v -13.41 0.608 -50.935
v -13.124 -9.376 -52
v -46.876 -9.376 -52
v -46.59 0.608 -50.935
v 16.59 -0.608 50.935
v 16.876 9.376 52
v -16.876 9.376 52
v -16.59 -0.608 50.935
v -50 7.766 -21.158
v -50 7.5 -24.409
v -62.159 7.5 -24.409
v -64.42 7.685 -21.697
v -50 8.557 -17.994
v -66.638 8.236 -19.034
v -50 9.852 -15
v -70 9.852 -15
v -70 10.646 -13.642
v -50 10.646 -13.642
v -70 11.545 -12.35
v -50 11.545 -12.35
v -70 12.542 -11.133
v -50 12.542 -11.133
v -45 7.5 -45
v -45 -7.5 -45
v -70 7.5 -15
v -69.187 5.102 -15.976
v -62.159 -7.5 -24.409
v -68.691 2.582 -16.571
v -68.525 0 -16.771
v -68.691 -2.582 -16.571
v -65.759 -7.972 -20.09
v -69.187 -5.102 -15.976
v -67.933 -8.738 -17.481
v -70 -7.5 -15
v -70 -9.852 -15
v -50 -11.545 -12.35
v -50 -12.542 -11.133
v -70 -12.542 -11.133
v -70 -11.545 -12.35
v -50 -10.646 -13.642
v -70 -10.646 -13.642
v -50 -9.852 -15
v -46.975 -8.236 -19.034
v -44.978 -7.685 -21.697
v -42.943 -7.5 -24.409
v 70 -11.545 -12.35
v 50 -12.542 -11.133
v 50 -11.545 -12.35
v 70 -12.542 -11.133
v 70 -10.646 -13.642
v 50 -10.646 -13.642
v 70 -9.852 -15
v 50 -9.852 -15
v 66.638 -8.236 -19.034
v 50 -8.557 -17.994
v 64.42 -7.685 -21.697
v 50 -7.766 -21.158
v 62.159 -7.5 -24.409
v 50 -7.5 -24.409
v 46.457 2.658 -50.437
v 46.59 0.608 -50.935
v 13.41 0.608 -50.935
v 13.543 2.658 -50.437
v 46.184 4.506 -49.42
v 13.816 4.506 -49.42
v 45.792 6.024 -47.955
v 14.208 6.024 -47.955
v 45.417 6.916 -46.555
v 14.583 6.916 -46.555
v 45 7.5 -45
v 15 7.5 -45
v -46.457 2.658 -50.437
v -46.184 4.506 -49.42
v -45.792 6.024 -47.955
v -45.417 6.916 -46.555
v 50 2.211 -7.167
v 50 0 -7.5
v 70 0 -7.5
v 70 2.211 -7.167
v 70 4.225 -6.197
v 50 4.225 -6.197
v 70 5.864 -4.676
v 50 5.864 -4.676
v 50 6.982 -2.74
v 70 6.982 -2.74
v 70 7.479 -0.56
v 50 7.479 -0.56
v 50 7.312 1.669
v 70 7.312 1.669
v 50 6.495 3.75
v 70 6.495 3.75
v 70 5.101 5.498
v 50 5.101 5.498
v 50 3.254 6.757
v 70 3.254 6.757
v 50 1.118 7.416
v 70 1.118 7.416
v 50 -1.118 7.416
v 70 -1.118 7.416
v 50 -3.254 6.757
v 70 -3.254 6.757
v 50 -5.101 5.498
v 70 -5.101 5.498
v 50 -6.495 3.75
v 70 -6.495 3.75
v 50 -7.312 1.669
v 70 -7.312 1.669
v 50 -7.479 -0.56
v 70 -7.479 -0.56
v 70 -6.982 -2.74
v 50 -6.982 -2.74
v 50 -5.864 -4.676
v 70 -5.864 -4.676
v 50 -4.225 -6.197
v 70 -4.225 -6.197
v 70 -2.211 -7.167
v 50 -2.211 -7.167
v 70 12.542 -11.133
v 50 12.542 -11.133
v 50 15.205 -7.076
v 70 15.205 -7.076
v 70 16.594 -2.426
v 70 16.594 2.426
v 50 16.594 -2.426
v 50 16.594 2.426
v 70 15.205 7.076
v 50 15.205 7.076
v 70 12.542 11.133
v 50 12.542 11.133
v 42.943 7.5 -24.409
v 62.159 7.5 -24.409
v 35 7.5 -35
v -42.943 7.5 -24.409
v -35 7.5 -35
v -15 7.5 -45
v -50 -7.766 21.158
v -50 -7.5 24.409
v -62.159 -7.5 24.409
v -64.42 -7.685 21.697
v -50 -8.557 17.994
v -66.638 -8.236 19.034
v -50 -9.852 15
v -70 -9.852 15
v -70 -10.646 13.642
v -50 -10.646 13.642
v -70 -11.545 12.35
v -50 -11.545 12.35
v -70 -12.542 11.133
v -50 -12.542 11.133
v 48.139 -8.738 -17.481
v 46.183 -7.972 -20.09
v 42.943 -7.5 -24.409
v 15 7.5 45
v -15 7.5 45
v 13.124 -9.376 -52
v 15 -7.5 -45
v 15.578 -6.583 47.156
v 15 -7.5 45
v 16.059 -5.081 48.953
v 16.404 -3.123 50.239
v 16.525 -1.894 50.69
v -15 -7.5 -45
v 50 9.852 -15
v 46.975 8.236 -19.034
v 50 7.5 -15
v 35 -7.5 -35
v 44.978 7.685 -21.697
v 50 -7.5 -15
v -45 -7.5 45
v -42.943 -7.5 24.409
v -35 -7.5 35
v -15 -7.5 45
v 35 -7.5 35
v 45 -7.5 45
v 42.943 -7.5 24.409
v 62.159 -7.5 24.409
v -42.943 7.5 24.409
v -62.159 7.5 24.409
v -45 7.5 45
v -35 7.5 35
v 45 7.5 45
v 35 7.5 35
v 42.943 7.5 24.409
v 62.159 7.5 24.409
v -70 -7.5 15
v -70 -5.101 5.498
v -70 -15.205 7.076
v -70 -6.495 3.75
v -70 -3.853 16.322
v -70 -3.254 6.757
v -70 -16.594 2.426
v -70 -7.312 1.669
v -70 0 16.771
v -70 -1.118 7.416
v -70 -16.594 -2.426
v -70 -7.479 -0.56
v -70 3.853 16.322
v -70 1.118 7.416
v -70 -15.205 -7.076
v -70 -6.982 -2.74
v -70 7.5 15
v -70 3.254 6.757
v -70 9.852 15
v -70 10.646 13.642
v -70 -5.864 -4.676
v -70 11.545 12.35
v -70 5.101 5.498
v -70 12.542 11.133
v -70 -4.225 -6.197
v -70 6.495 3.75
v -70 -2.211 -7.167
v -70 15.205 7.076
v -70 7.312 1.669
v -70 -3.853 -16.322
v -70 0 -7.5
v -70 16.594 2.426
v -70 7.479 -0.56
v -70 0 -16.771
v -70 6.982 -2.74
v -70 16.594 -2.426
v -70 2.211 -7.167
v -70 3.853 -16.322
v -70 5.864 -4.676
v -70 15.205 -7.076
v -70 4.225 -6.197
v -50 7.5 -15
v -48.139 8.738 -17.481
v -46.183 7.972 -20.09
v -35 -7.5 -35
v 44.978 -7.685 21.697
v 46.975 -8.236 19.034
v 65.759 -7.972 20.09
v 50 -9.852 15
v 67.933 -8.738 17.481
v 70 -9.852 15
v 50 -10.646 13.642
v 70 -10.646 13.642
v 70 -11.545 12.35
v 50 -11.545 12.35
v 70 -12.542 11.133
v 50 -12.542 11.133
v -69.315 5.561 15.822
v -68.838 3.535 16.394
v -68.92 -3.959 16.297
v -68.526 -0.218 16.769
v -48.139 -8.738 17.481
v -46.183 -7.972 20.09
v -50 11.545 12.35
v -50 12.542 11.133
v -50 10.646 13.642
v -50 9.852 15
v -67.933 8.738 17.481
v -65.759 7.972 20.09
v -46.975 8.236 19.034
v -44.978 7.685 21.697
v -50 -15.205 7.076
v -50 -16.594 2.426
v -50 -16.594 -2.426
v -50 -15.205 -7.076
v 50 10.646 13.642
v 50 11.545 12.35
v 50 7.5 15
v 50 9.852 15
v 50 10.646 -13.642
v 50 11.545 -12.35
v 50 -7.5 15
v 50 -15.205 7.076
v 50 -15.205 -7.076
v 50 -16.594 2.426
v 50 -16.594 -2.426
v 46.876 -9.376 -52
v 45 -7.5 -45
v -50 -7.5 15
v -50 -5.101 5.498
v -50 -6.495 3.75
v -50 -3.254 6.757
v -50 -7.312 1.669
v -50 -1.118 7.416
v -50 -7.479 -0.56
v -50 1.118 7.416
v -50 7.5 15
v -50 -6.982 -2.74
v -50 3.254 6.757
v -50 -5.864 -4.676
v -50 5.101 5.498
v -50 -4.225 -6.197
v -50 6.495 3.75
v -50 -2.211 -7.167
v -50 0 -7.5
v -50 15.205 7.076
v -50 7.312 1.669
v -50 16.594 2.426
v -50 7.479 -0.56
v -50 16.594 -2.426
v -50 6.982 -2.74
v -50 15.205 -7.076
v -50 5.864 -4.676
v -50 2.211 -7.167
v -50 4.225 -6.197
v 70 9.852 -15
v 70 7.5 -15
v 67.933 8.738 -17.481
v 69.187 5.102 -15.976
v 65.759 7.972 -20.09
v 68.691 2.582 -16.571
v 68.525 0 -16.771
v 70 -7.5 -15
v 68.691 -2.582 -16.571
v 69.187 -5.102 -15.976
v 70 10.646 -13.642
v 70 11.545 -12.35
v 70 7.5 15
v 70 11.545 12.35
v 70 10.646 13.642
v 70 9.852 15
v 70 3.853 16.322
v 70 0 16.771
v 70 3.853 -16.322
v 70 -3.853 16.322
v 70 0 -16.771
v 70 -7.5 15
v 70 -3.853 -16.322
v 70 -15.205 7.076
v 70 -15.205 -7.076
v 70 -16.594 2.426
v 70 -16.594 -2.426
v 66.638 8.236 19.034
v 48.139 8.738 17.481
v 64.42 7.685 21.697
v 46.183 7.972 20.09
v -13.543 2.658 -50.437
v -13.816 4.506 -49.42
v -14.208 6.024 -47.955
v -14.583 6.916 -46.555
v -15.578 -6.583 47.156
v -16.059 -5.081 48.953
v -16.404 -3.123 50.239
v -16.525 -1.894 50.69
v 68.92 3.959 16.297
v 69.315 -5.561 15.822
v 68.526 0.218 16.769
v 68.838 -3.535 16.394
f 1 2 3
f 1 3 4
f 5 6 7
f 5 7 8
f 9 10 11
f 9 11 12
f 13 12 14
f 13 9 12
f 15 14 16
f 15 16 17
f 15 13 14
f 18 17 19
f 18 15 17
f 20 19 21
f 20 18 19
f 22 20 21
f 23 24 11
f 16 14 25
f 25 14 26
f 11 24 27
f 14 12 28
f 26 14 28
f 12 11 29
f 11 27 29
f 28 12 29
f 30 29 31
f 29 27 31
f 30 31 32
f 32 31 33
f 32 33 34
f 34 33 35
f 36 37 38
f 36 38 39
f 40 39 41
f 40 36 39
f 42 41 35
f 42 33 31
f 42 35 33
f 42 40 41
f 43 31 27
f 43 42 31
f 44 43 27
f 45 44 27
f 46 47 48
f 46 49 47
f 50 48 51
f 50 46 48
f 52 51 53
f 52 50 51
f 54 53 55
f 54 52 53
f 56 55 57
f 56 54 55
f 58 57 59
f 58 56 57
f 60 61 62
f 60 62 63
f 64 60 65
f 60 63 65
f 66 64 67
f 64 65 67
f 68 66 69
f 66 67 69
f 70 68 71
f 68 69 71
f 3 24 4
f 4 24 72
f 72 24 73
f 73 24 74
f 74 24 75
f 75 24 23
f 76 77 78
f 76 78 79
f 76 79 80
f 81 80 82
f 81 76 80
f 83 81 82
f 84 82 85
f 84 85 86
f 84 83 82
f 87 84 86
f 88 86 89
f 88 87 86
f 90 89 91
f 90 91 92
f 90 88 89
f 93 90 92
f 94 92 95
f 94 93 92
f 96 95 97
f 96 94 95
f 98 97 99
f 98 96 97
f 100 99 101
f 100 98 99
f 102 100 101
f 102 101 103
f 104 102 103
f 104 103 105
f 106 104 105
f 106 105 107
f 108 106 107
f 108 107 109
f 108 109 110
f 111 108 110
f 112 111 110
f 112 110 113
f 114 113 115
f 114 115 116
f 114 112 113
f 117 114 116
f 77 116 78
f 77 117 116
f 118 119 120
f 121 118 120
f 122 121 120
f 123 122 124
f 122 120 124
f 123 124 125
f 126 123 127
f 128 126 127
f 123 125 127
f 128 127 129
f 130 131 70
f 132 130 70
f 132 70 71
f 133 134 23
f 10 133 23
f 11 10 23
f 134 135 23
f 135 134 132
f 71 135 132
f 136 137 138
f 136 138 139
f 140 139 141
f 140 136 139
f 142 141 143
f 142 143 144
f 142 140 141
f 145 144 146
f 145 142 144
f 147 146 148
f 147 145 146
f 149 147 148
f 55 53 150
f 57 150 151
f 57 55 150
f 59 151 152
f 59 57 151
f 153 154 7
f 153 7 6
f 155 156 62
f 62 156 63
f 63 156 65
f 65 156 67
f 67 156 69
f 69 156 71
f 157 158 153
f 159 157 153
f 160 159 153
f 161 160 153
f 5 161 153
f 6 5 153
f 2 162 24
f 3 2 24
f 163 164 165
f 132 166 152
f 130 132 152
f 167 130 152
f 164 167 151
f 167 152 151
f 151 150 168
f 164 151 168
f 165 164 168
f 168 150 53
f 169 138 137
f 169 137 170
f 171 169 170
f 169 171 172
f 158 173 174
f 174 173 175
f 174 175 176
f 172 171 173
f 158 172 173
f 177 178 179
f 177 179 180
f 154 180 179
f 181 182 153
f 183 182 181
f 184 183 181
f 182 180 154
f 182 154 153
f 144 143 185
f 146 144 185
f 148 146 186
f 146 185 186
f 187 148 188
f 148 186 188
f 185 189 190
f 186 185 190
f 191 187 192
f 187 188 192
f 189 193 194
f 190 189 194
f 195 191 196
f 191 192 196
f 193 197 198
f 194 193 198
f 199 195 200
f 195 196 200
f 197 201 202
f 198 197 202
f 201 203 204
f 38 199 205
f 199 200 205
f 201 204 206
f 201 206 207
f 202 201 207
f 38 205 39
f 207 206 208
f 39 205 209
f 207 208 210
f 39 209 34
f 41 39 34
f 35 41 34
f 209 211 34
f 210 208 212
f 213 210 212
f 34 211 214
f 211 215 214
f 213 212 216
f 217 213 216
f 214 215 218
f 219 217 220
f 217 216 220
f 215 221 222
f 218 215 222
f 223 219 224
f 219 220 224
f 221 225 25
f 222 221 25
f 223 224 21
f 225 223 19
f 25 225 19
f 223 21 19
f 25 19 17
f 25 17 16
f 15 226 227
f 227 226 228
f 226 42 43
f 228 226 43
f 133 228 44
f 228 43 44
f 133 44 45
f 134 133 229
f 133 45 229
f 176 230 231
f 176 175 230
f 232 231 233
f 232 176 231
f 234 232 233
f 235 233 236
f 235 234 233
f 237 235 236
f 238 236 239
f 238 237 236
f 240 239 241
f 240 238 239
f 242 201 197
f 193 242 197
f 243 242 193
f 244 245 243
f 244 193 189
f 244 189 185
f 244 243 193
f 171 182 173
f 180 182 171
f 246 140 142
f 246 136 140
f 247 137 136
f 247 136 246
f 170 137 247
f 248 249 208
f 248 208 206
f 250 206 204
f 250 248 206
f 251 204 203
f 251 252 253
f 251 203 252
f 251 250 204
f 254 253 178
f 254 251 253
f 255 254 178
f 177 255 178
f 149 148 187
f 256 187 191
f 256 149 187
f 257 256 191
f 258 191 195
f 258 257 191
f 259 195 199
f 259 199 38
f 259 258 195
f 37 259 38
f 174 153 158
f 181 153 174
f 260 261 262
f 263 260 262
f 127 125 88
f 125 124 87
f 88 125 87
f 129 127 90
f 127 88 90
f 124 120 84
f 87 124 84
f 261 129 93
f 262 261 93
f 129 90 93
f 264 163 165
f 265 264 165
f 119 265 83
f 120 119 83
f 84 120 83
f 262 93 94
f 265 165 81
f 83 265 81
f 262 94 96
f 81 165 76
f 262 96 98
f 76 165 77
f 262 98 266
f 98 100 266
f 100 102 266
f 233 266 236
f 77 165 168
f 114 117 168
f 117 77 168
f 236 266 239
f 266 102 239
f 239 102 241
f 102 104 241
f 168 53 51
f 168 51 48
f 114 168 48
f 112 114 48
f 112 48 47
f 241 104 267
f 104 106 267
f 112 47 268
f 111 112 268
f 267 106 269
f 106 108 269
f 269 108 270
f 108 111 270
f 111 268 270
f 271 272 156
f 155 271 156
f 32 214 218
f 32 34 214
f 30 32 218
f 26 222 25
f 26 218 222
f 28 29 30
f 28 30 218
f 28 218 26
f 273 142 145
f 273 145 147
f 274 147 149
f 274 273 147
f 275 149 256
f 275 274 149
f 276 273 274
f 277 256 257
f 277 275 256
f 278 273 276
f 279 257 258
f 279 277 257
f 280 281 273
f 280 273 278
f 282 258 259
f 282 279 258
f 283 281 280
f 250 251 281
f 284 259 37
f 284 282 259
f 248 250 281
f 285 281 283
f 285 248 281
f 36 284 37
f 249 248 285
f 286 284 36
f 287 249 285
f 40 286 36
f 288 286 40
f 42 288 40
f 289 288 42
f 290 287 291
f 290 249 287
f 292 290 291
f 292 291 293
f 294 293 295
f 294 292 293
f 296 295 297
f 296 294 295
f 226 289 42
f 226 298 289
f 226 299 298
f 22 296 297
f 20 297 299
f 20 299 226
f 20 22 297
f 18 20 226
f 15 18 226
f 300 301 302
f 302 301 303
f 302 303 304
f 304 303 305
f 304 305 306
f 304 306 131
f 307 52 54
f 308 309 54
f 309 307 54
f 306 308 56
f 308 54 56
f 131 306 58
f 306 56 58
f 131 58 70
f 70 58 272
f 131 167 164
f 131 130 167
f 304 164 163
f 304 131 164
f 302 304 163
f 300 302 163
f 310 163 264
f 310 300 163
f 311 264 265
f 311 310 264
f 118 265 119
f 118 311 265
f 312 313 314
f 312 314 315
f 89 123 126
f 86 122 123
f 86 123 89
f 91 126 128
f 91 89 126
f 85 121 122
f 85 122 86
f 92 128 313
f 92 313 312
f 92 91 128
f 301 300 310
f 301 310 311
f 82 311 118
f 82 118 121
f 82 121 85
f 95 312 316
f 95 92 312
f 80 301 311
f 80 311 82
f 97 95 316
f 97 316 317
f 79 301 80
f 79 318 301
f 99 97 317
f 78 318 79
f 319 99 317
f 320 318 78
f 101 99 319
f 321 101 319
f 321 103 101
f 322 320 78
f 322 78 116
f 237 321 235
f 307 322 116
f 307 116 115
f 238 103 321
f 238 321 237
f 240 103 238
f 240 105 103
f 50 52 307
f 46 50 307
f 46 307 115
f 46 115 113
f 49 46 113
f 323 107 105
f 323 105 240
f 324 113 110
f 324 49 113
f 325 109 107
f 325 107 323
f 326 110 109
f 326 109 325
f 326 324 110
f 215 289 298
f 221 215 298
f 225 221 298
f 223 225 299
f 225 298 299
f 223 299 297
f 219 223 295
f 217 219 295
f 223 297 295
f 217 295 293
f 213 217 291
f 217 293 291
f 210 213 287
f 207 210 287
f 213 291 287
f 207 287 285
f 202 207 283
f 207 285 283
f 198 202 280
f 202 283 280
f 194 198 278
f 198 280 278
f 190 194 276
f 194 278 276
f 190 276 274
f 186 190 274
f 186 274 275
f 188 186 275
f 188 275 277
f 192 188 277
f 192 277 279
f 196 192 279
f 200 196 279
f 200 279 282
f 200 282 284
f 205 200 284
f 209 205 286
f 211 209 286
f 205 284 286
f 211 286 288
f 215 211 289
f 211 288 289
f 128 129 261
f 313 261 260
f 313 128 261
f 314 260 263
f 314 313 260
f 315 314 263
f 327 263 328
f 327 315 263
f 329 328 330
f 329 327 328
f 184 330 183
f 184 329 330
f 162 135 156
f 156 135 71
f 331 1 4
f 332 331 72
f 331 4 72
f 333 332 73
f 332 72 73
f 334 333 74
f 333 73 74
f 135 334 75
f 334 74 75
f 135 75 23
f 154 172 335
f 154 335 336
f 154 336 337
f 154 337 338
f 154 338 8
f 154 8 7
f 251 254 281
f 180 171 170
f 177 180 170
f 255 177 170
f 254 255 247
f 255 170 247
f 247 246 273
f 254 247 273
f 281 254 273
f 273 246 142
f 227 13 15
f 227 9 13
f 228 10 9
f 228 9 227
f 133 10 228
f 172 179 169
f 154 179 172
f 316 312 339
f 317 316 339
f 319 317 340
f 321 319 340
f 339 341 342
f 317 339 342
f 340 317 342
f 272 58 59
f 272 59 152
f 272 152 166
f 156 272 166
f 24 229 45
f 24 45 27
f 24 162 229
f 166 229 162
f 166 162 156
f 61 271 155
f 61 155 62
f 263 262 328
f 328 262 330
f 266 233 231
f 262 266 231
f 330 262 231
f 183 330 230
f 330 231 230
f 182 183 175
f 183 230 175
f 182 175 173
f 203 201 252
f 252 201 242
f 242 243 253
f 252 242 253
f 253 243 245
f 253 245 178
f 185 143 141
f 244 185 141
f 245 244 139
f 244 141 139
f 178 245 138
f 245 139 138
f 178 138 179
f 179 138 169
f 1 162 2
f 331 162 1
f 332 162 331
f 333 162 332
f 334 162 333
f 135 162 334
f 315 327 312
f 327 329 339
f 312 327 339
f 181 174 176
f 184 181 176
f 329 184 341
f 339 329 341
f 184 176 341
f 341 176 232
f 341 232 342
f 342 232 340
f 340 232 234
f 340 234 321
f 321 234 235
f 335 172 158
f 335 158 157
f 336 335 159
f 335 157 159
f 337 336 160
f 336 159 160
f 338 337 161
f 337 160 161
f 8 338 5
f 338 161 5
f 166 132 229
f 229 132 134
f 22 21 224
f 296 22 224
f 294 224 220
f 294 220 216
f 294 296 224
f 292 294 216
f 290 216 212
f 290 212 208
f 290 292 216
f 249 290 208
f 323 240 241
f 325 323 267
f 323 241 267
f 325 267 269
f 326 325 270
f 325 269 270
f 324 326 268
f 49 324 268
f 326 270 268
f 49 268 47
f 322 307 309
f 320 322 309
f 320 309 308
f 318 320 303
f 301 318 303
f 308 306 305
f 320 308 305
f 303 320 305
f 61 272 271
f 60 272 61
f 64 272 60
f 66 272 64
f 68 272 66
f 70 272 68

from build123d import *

# Parameters (mm, degrees)
RESSALTO_EXTRUS_O1_DEPTH           = 7.5
RESSALTO_EXTRUS_O1_2_DEPTH         = 7.5
ESBO_O2_R                          = 16.770509831
ESBO_O2_R_2                        = 7.5
RESSALTO_EXTRUS_O2_DEPTH           = 20
FILETE1_R                          = 20
ESBO_O3_W                          = 30
ESBO_O3_H                          = 15
RESSALTO_EXTRUS_O3_DEPTH           = 7
RESSALTO_EXTRUS_O3_DRAFT           = -15
ESBO_O4_W                          = 30
ESBO_O4_H                          = 15
RESSALTO_EXTRUS_O4_DEPTH           = 7
RESSALTO_EXTRUS_O4_DRAFT           = -15
RESSALTO_EXTRUS_O4_PROFILE_2_DEPTH = 7
RESSALTO_EXTRUS_O4_PROFILE_2_DRAFT = -15
CORTE_EXTRUS_O1_DEPTH              = 16.88
CORTE_EXTRUS_O2_DEPTH              = 46.88
FILETE4_R                          = 8


with BuildPart() as part:
    # Esboço1 → Ressalto-extrusão1 (new, symmetric)
    with BuildSketch(Plane(origin=(0, 0, 0), x_dir=(1, 0, 0), z_dir=(0, 1, 0))):
        Polygon((45, -45), (70, -15), (50, -15), (35, -35), (-35, -35), (-50, -15), (-70, -15), (-45, -45), align=None)
    extrude(amount=RESSALTO_EXTRUS_O1_DEPTH, both=True)



with BuildPart() as body_2:
    # Esboço1 → Ressalto-extrus_o1 2 (new, symmetric)
    with BuildSketch(Plane(origin=(0, 0, 0), x_dir=(1, 0, 0), z_dir=(0, 1, 0))):
        Polygon((70, 15), (50, 15), (35, 35), (-35, 35), (-50, 15), (-70, 15), (-45, 45), (45, 45), align=None)
    extrude(amount=RESSALTO_EXTRUS_O1_2_DEPTH, both=True)


with BuildPart() as part_1:
    add(part.part)

    add(body_2.part)  # Ressalto-extrusão2 merges body 2
    # Esboço2 → Ressalto-extrusão2 (add)
    with BuildSketch(Plane(origin=(-50, 0, 0), x_dir=(0, 0, -1), z_dir=(1, 0, 0))):
        Circle(ESBO_O2_R)
        Circle(ESBO_O2_R_2, mode=Mode.SUBTRACT)
    ressalto_extrus_o2 = extrude(amount=-RESSALTO_EXTRUS_O2_DEPTH)

    # Espelhar1: Ressalto-extrusão2 across plane
    add(ressalto_extrus_o2.mirror(Plane(origin=(0, 0, 0), x_dir=(0, 0, 1), z_dir=(1, 0, 0))))

    # Filete1
    # the kernel refuses this fillet: 20 mm, written as the material it adds along each edge
    with BuildSketch(Plane(origin=(70, -7.5, 15), x_dir=(0, 0, 1), z_dir=(-1, 0, 0))) as filete1_piece_1_section:
        with BuildLine():
            CenterArc((9.409432465, -20), FILETE1_R, 90, 41.59276394)
            ThreePointArc((-3.867202848, -5.042361324), (-1.692591399, -2.706021572), (0, 0))
            Line((0, 0), (9.409432465, 0))
        make_face()
    filete1_piece_1 = extrude(amount=20, mode=Mode.PRIVATE)
    filete1_piece_1 = split(filete1_piece_1, bisect_by=Plane(origin=(64.976467601, -8.579836869, 21.028238879), z_dir=(-0.7682212795973759, 0, -0.6401843996644799)), keep=Keep.TOP, mode=Mode.PRIVATE)
    filete1_piece_1 = split(filete1_piece_1, bisect_by=Plane(origin=(52.72088695, -8.579836869, 11.372150733), z_dir=(0.7999999999999996, 0, 0.6000000000000005)), keep=Keep.TOP, mode=Mode.PRIVATE)
    add(filete1_piece_1)
    with BuildSketch(Plane(origin=(70, -7.5, 15), x_dir=(0, 0, 1), z_dir=(-1, 0, 0))) as filete1_piece_2_section:
        with BuildLine():
            CenterArc((9.409432465, -20), FILETE1_R, 90, 41.59276394)
            ThreePointArc((-3.867202848, -5.042361324), (-1.692591399, -2.706021572), (0, 0))
            Line((0, 0), (9.409432465, 0))
        make_face()
    filete1_piece_2 = extrude(amount=20, mode=Mode.PRIVATE)
    filete1_piece_2 = split(filete1_piece_2, bisect_by=Plane(origin=(51.352262371, -10.660732835, 13.196983505), z_dir=(-0.7999999999999996, 0, -0.6000000000000005)), keep=Keep.TOP, mode=Mode.PRIVATE)
    add(filete1_piece_2)
    with BuildSketch(Plane(origin=(70, -7.5, 15), x_dir=(0, 0, 1), z_dir=(-1, 0, 0))) as filete1_piece_3_section:
        with BuildLine():
            CenterArc((9.409432465, -20), FILETE1_R, 90, 41.59276394)
            ThreePointArc((-3.867202848, -5.042361324), (-1.692591399, -2.706021572), (0, 0))
            Line((0, 0), (9.409432465, 0))
        make_face()
    filete1_piece_3 = extrude(amount=43.523581162, mode=Mode.PRIVATE)
    filete1_piece_3 = split(filete1_piece_3, bisect_by=Plane(origin=(46.899144186, -7.62078926, 19.134474419), z_dir=(0.7999999999999996, 0, 0.6000000000000005)), keep=Keep.TOP, mode=Mode.PRIVATE)
    filete1_piece_3 = split(filete1_piece_3, bisect_by=Plane(origin=(50, -7.62078926, 20.042041974), z_dir=(-1, 0, 0)), keep=Keep.TOP, mode=Mode.PRIVATE)
    add(filete1_piece_3)
    with BuildSketch(Plane(origin=(-26.476418838, 7.5, 15), x_dir=(0, 0.7935005396361219, -0.6085695470504449), z_dir=(-1, 0, 0))) as filete1_piece_4_section:
        with BuildLine():
            CenterArc((10.14371674, -19.637780679), FILETE1_R, 100.921092441, 41.59276394)
            Line((-5.726294053, -7.466389738), (0, 0))
            ThreePointArc((0, 0), (3.177289158, -0.303730134), (6.354578317, 0))
        make_face()
    filete1_piece_4 = extrude(amount=43.523581162, mode=Mode.PRIVATE)
    filete1_piece_4 = split(filete1_piece_4, bisect_by=Plane(origin=(-50, 7.62078926, 20.042041974), z_dir=(1, 0, 0)), keep=Keep.TOP, mode=Mode.PRIVATE)
    filete1_piece_4 = split(filete1_piece_4, bisect_by=Plane(origin=(-46.899144186, 7.62078926, 19.134474419), z_dir=(-0.7999999999999992, 0, 0.6000000000000011)), keep=Keep.TOP, mode=Mode.PRIVATE)
    add(filete1_piece_4)
    with BuildSketch(Plane(origin=(-50, 7.5, 15), x_dir=(0, 0.7935005396361215, -0.6085695470504452), z_dir=(-1, 0, 0))) as filete1_piece_5_section:
        with BuildLine():
            CenterArc((10.14371674, -19.637780679), FILETE1_R, 100.921092441, 41.59276394)
            Line((-5.726294053, -7.466389738), (0, 0))
            ThreePointArc((0, 0), (3.177289158, -0.303730134), (6.354578317, 0))
        make_face()
    filete1_piece_5 = extrude(amount=20, mode=Mode.PRIVATE)
    filete1_piece_5 = split(filete1_piece_5, bisect_by=Plane(origin=(-51.352262371, 10.660732835, 13.196983505), z_dir=(0.7999999999999992, 0, -0.6000000000000011)), keep=Keep.TOP, mode=Mode.PRIVATE)
    add(filete1_piece_5)
    with BuildSketch(Plane(origin=(-50, 7.5, 15), x_dir=(0, 0.7935005396361215, -0.6085695470504452), z_dir=(-1, 0, 0))) as filete1_piece_6_section:
        with BuildLine():
            CenterArc((10.14371674, -19.637780679), FILETE1_R, 100.921092441, 41.59276394)
            Line((-5.726294053, -7.466389738), (0, 0))
            ThreePointArc((0, 0), (3.177289158, -0.303730134), (6.354578317, 0))
        make_face()
    filete1_piece_6 = extrude(amount=20, mode=Mode.PRIVATE)
    filete1_piece_6 = split(filete1_piece_6, bisect_by=Plane(origin=(-64.976467601, 8.579836869, 21.028238879), z_dir=(0.7682212795973756, 0, -0.6401843996644802)), keep=Keep.TOP, mode=Mode.PRIVATE)
    filete1_piece_6 = split(filete1_piece_6, bisect_by=Plane(origin=(-52.72088695, 8.579836869, 11.372150733), z_dir=(-0.7999999999999992, 0, 0.6000000000000011)), keep=Keep.TOP, mode=Mode.PRIVATE)
    add(filete1_piece_6)
    with BuildSketch(Plane(origin=(70, 7.5, -15), x_dir=(0, 0.7935005396361229, 0.6085695470504434), z_dir=(-1, 0, 0))) as filete1_piece_7_section:
        with BuildLine():
            CenterArc((10.14371674, 19.637780679), FILETE1_R, 217.486143619, 41.59276394)
            Line((-5.726294053, 7.466389738), (0, 0))
            ThreePointArc((0, 0), (3.177289158, 0.303730134), (6.354578317, 0))
        make_face()
    filete1_piece_7 = extrude(amount=20, mode=Mode.PRIVATE)
    filete1_piece_7 = split(filete1_piece_7, bisect_by=Plane(origin=(52.72088695, 8.579836869, -11.372150733), z_dir=(0.7999999999999996, 0, -0.6000000000000005)), keep=Keep.TOP, mode=Mode.PRIVATE)
    filete1_piece_7 = split(filete1_piece_7, bisect_by=Plane(origin=(64.976467601, 8.579836869, -21.028238879), z_dir=(-0.7682212795973757, 0, 0.6401843996644802)), keep=Keep.TOP, mode=Mode.PRIVATE)
    add(filete1_piece_7)
    with BuildSketch(Plane(origin=(70, 7.5, -15), x_dir=(0, 0.7935005396361229, 0.6085695470504434), z_dir=(-1, 0, 0))) as filete1_piece_8_section:
        with BuildLine():
            CenterArc((10.14371674, 19.637780679), FILETE1_R, 217.486143619, 41.59276394)
            Line((-5.726294053, 7.466389738), (0, 0))
            ThreePointArc((0, 0), (3.177289158, 0.303730134), (6.354578317, 0))
        make_face()
    filete1_piece_8 = extrude(amount=43.523581162, mode=Mode.PRIVATE)
    filete1_piece_8 = split(filete1_piece_8, bisect_by=Plane(origin=(46.899144186, 7.62078926, -19.134474419), z_dir=(0.7999999999999996, 0, -0.6000000000000005)), keep=Keep.TOP, mode=Mode.PRIVATE)
    filete1_piece_8 = split(filete1_piece_8, bisect_by=Plane(origin=(50, 7.62078926, -20.042041974), z_dir=(-1, 0, 0)), keep=Keep.TOP, mode=Mode.PRIVATE)
    add(filete1_piece_8)
    with BuildSketch(Plane(origin=(70, 7.5, -15), x_dir=(0, 0.7935005396361229, 0.6085695470504434), z_dir=(-1, 0, 0))) as filete1_piece_9_section:
        with BuildLine():
            CenterArc((10.14371674, 19.637780679), FILETE1_R, 217.486143619, 41.59276394)
            Line((-5.726294053, 7.466389738), (0, 0))
            ThreePointArc((0, 0), (3.177289158, 0.303730134), (6.354578317, 0))
        make_face()
    filete1_piece_9 = extrude(amount=20, mode=Mode.PRIVATE)
    filete1_piece_9 = split(filete1_piece_9, bisect_by=Plane(origin=(51.352262371, 10.660732835, -13.196983505), z_dir=(-0.7999999999999996, 0, 0.6000000000000005)), keep=Keep.TOP, mode=Mode.PRIVATE)
    add(filete1_piece_9)
    with BuildSketch(Plane(origin=(-50, 7.5, -15), x_dir=(0, 0, -1), z_dir=(-1, 0, 0))) as filete1_piece_10_section:
        with BuildLine():
            CenterArc((9.409432465, -20), FILETE1_R, 90, 41.59276394)
            ThreePointArc((-3.867202848, -5.042361324), (-1.692591399, -2.706021572), (0, 0))
            Line((0, 0), (9.409432465, 0))
        make_face()
    filete1_piece_10 = extrude(amount=20, mode=Mode.PRIVATE)
    filete1_piece_10 = split(filete1_piece_10, bisect_by=Plane(origin=(-51.352262371, 10.660732835, -13.196983505), z_dir=(0.7999999999999999, 0, 0.6000000000000002)), keep=Keep.TOP, mode=Mode.PRIVATE)
    add(filete1_piece_10)
    with BuildSketch(Plane(origin=(-26.476418838, 7.5, -15), x_dir=(0, 0, -1), z_dir=(-1, 0, 0))) as filete1_piece_11_section:
        with BuildLine():
            CenterArc((9.409432465, -20), FILETE1_R, 90, 41.59276394)
            ThreePointArc((-3.867202848, -5.042361324), (-1.692591399, -2.706021572), (0, 0))
            Line((0, 0), (9.409432465, 0))
        make_face()
    filete1_piece_11 = extrude(amount=43.523581162, mode=Mode.PRIVATE)
    filete1_piece_11 = split(filete1_piece_11, bisect_by=Plane(origin=(-50, 7.62078926, -20.042041974), z_dir=(1, 0, 0)), keep=Keep.TOP, mode=Mode.PRIVATE)
    filete1_piece_11 = split(filete1_piece_11, bisect_by=Plane(origin=(-46.899144186, 7.62078926, -19.134474419), z_dir=(-0.7999999999999999, 0, -0.6000000000000002)), keep=Keep.TOP, mode=Mode.PRIVATE)
    add(filete1_piece_11)
    with BuildSketch(Plane(origin=(-50, 7.5, -15), x_dir=(0, 0, -1), z_dir=(-1, 0, 0))) as filete1_piece_12_section:
        with BuildLine():
            CenterArc((9.409432465, -20), FILETE1_R, 90, 41.59276394)
            ThreePointArc((-3.867202848, -5.042361324), (-1.692591399, -2.706021572), (0, 0))
            Line((0, 0), (9.409432465, 0))
        make_face()
    filete1_piece_12 = extrude(amount=20, mode=Mode.PRIVATE)
    filete1_piece_12 = split(filete1_piece_12, bisect_by=Plane(origin=(-52.72088695, 8.579836869, -11.372150733), z_dir=(-0.7999999999999999, 0, -0.6000000000000002)), keep=Keep.TOP, mode=Mode.PRIVATE)
    filete1_piece_12 = split(filete1_piece_12, bisect_by=Plane(origin=(-64.976467601, 8.579836869, -21.028238879), z_dir=(0.7682212795973755, 0, 0.6401843996644803)), keep=Keep.TOP, mode=Mode.PRIVATE)
    add(filete1_piece_12)
    with BuildSketch(Plane(origin=(70, -7.5, -15), x_dir=(0, 0, -1), z_dir=(-1, 0, 0))) as filete1_piece_13_section:
        with BuildLine():
            CenterArc((9.409432465, 20), FILETE1_R, 228.40723606, 41.59276394)
            ThreePointArc((-3.867202848, 5.042361324), (-1.692591399, 2.706021572), (0, 0))
            Line((0, 0), (9.409432465, 0))
        make_face()
    filete1_piece_13 = extrude(amount=20, mode=Mode.PRIVATE)
    filete1_piece_13 = split(filete1_piece_13, bisect_by=Plane(origin=(52.72088695, -8.579836869, -11.372150733), z_dir=(0.7999999999999996, 0, -0.6000000000000005)), keep=Keep.TOP, mode=Mode.PRIVATE)
    filete1_piece_13 = split(filete1_piece_13, bisect_by=Plane(origin=(64.976467601, -8.579836869, -21.028238879), z_dir=(-0.7682212795973757, 0, 0.6401843996644802)), keep=Keep.TOP, mode=Mode.PRIVATE)
    add(filete1_piece_13)
    with BuildSketch(Plane(origin=(70, -7.5, -15), x_dir=(0, 0, -1), z_dir=(-1, 0, 0))) as filete1_piece_14_section:
        with BuildLine():
            CenterArc((9.409432465, 20), FILETE1_R, 228.40723606, 41.59276394)
            ThreePointArc((-3.867202848, 5.042361324), (-1.692591399, 2.706021572), (0, 0))
            Line((0, 0), (9.409432465, 0))
        make_face()
    filete1_piece_14 = extrude(amount=20, mode=Mode.PRIVATE)
    filete1_piece_14 = split(filete1_piece_14, bisect_by=Plane(origin=(51.352262371, -10.660732835, -13.196983505), z_dir=(-0.7999999999999996, 0, 0.6000000000000005)), keep=Keep.TOP, mode=Mode.PRIVATE)
    add(filete1_piece_14)
    with BuildSketch(Plane(origin=(70, -7.5, -15), x_dir=(0, 0, -1), z_dir=(-1, 0, 0))) as filete1_piece_15_section:
        with BuildLine():
            CenterArc((9.409432465, 20), FILETE1_R, 228.40723606, 41.59276394)
            ThreePointArc((-3.867202848, 5.042361324), (-1.692591399, 2.706021572), (0, 0))
            Line((0, 0), (9.409432465, 0))
        make_face()
    filete1_piece_15 = extrude(amount=43.523581162, mode=Mode.PRIVATE)
    filete1_piece_15 = split(filete1_piece_15, bisect_by=Plane(origin=(46.899144186, -7.62078926, -19.134474419), z_dir=(0.7999999999999996, 0, -0.6000000000000005)), keep=Keep.TOP, mode=Mode.PRIVATE)
    filete1_piece_15 = split(filete1_piece_15, bisect_by=Plane(origin=(50, -7.62078926, -20.042041974), z_dir=(-1, 0, 0)), keep=Keep.TOP, mode=Mode.PRIVATE)
    add(filete1_piece_15)
    with BuildSketch(Plane(origin=(-50, -7.5, -15), x_dir=(0, 0, -1), z_dir=(-1, 0, 0))) as filete1_piece_16_section:
        with BuildLine():
            CenterArc((9.409432465, 20), FILETE1_R, 228.40723606, 41.59276394)
            ThreePointArc((-3.867202848, 5.042361324), (-1.692591399, 2.706021572), (0, 0))
            Line((0, 0), (9.409432465, 0))
        make_face()
    filete1_piece_16 = extrude(amount=20, mode=Mode.PRIVATE)
    filete1_piece_16 = split(filete1_piece_16, bisect_by=Plane(origin=(-51.352262371, -10.660732835, -13.196983505), z_dir=(0.7999999999999999, 0, 0.6000000000000002)), keep=Keep.TOP, mode=Mode.PRIVATE)
    add(filete1_piece_16)
    with BuildSketch(Plane(origin=(-26.476418838, -7.5, -15), x_dir=(0, 0, -1), z_dir=(-1, 0, 0))) as filete1_piece_17_section:
        with BuildLine():
            CenterArc((9.409432465, 20), FILETE1_R, 228.40723606, 41.59276394)
            ThreePointArc((-3.867202848, 5.042361324), (-1.692591399, 2.706021572), (0, 0))
            Line((0, 0), (9.409432465, 0))
        make_face()
    filete1_piece_17 = extrude(amount=43.523581162, mode=Mode.PRIVATE)
    filete1_piece_17 = split(filete1_piece_17, bisect_by=Plane(origin=(-50, -7.62078926, -20.042041974), z_dir=(1, 0, 0)), keep=Keep.TOP, mode=Mode.PRIVATE)
    filete1_piece_17 = split(filete1_piece_17, bisect_by=Plane(origin=(-46.899144186, -7.62078926, -19.134474419), z_dir=(-0.7999999999999999, 0, -0.6000000000000002)), keep=Keep.TOP, mode=Mode.PRIVATE)
    add(filete1_piece_17)
    with BuildSketch(Plane(origin=(-50, -7.5, -15), x_dir=(0, 0, -1), z_dir=(-1, 0, 0))) as filete1_piece_18_section:
        with BuildLine():
            CenterArc((9.409432465, 20), FILETE1_R, 228.40723606, 41.59276394)
            ThreePointArc((-3.867202848, 5.042361324), (-1.692591399, 2.706021572), (0, 0))
            Line((0, 0), (9.409432465, 0))
        make_face()
    filete1_piece_18 = extrude(amount=20, mode=Mode.PRIVATE)
    filete1_piece_18 = split(filete1_piece_18, bisect_by=Plane(origin=(-52.72088695, -8.579836869, -11.372150733), z_dir=(-0.7999999999999999, 0, -0.6000000000000002)), keep=Keep.TOP, mode=Mode.PRIVATE)
    filete1_piece_18 = split(filete1_piece_18, bisect_by=Plane(origin=(-64.976467601, -8.579836869, -21.028238879), z_dir=(0.7682212795973755, 0, 0.6401843996644803)), keep=Keep.TOP, mode=Mode.PRIVATE)
    add(filete1_piece_18)
    with BuildSketch(Plane(origin=(70, 7.5, 15), x_dir=(0, 0.7935005396361229, -0.6085695470504434), z_dir=(-1, 0, 0))) as filete1_piece_19_section:
        with BuildLine():
            CenterArc((10.14371674, -19.637780679), FILETE1_R, 100.921092441, 41.59276394)
            Line((-5.726294053, -7.466389738), (0, 0))
            ThreePointArc((0, 0), (3.177289158, -0.303730134), (6.354578317, 0))
        make_face()
    filete1_piece_19 = extrude(amount=20, mode=Mode.PRIVATE)
    filete1_piece_19 = split(filete1_piece_19, bisect_by=Plane(origin=(64.976467601, 8.579836869, 21.028238879), z_dir=(-0.7682212795973759, 0, -0.6401843996644799)), keep=Keep.TOP, mode=Mode.PRIVATE)
    filete1_piece_19 = split(filete1_piece_19, bisect_by=Plane(origin=(52.72088695, 8.579836869, 11.372150733), z_dir=(0.7999999999999996, 0, 0.6000000000000005)), keep=Keep.TOP, mode=Mode.PRIVATE)
    add(filete1_piece_19)
    with BuildSketch(Plane(origin=(70, 7.5, 15), x_dir=(0, 0.7935005396361229, -0.6085695470504434), z_dir=(-1, 0, 0))) as filete1_piece_20_section:
        with BuildLine():
            CenterArc((10.14371674, -19.637780679), FILETE1_R, 100.921092441, 41.59276394)
            Line((-5.726294053, -7.466389738), (0, 0))
            ThreePointArc((0, 0), (3.177289158, -0.303730134), (6.354578317, 0))
        make_face()
    filete1_piece_20 = extrude(amount=43.523581162, mode=Mode.PRIVATE)
    filete1_piece_20 = split(filete1_piece_20, bisect_by=Plane(origin=(50, 7.62078926, 20.042041974), z_dir=(-1, 0, 0)), keep=Keep.TOP, mode=Mode.PRIVATE)
    filete1_piece_20 = split(filete1_piece_20, bisect_by=Plane(origin=(46.899144186, 7.62078926, 19.134474419), z_dir=(0.7999999999999996, 0, 0.6000000000000005)), keep=Keep.TOP, mode=Mode.PRIVATE)
    add(filete1_piece_20)
    with BuildSketch(Plane(origin=(70, 7.5, 15), x_dir=(0, 0.7935005396361229, -0.6085695470504434), z_dir=(-1, 0, 0))) as filete1_piece_21_section:
        with BuildLine():
            CenterArc((10.14371674, -19.637780679), FILETE1_R, 100.921092441, 41.59276394)
            Line((-5.726294053, -7.466389738), (0, 0))
            ThreePointArc((0, 0), (3.177289158, -0.303730134), (6.354578317, 0))
        make_face()
    filete1_piece_21 = extrude(amount=20, mode=Mode.PRIVATE)
    filete1_piece_21 = split(filete1_piece_21, bisect_by=Plane(origin=(51.352262371, 10.660732835, 13.196983505), z_dir=(-0.7999999999999996, 0, -0.6000000000000005)), keep=Keep.TOP, mode=Mode.PRIVATE)
    add(filete1_piece_21)
    with BuildSketch(Plane(origin=(-50, -7.5, 15), x_dir=(0, 0, 1), z_dir=(-1, 0, 0))) as filete1_piece_22_section:
        with BuildLine():
            CenterArc((9.409432465, -20), FILETE1_R, 90, 41.59276394)
            ThreePointArc((-3.867202848, -5.042361324), (-1.692591399, -2.706021572), (0, 0))
            Line((0, 0), (9.409432465, 0))
        make_face()
    filete1_piece_22 = extrude(amount=20, mode=Mode.PRIVATE)
    filete1_piece_22 = split(filete1_piece_22, bisect_by=Plane(origin=(-51.352262371, -10.660732835, 13.196983505), z_dir=(0.7999999999999992, 0, -0.6000000000000011)), keep=Keep.TOP, mode=Mode.PRIVATE)
    add(filete1_piece_22)
    with BuildSketch(Plane(origin=(-26.476418838, -7.5, 15), x_dir=(0, 0, 1), z_dir=(-1, 0, 0))) as filete1_piece_23_section:
        with BuildLine():
            CenterArc((9.409432465, -20), FILETE1_R, 90, 41.59276394)
            ThreePointArc((-3.867202848, -5.042361324), (-1.692591399, -2.706021572), (0, 0))
            Line((0, 0), (9.409432465, 0))
        make_face()
    filete1_piece_23 = extrude(amount=43.523581162, mode=Mode.PRIVATE)
    filete1_piece_23 = split(filete1_piece_23, bisect_by=Plane(origin=(-46.899144186, -7.62078926, 19.134474419), z_dir=(-0.7999999999999992, 0, 0.6000000000000011)), keep=Keep.TOP, mode=Mode.PRIVATE)
    filete1_piece_23 = split(filete1_piece_23, bisect_by=Plane(origin=(-50, -7.62078926, 20.042041974), z_dir=(1, 0, 0)), keep=Keep.TOP, mode=Mode.PRIVATE)
    add(filete1_piece_23)
    with BuildSketch(Plane(origin=(-50, -7.5, 15), x_dir=(0, 0, 1), z_dir=(-1, 0, 0))) as filete1_piece_24_section:
        with BuildLine():
            CenterArc((9.409432465, -20), FILETE1_R, 90, 41.59276394)
            ThreePointArc((-3.867202848, -5.042361324), (-1.692591399, -2.706021572), (0, 0))
            Line((0, 0), (9.409432465, 0))
        make_face()
    filete1_piece_24 = extrude(amount=20, mode=Mode.PRIVATE)
    filete1_piece_24 = split(filete1_piece_24, bisect_by=Plane(origin=(-52.72088695, -8.579836869, 11.372150733), z_dir=(-0.7999999999999992, 0, 0.6000000000000011)), keep=Keep.TOP, mode=Mode.PRIVATE)
    filete1_piece_24 = split(filete1_piece_24, bisect_by=Plane(origin=(-64.976467601, -8.579836869, 21.028238879), z_dir=(0.7682212795973756, 0, -0.6401843996644802)), keep=Keep.TOP, mode=Mode.PRIVATE)
    add(filete1_piece_24)


with BuildPart() as ressalto_extrus_o3_tool:
    # Esboço3 → Ressalto-extrusão3 (with draft: the straight prism first)
    with BuildSketch(Plane.XY.offset(45)):
        Rectangle(ESBO_O3_W, ESBO_O3_H)
    extrude(amount=RESSALTO_EXTRUS_O3_DEPTH)
    # Ressalto-extrusão3: the draft: its side faces are tilted about the plane it starts from
    ressalto_extrus_o3_sides = [ressalto_extrus_o3_tool.faces().sort_by_distance(p)[0] for p in [
        (0, -7.5, 48.5),
        (15, 0, 48.5),
        (0, 7.5, 48.5),
        (-15, 0, 48.5),
    ]]
    draft(ressalto_extrus_o3_sides, Plane.XY.offset(45), RESSALTO_EXTRUS_O3_DRAFT)


with BuildPart() as part_2:
    add(part_1.part)

    # Ressalto-extrusão3: add ressalto_extrus_o3_tool
    add(ressalto_extrus_o3_tool.part)


with BuildPart() as ressalto_extrus_o4_tool:
    # Esboço4 → Ressalto-extrusão4 (with draft: the straight prism first)
    with BuildSketch(Plane(origin=(0, 0, -45), x_dir=(-1, 0, 0), z_dir=(0, 0, -1))):
        with Locations((-30, 0)):
            Rectangle(ESBO_O4_W, ESBO_O4_H)
    extrude(amount=RESSALTO_EXTRUS_O4_DEPTH)
    # Ressalto-extrusão4: the draft: its side faces are tilted about the plane it starts from
    ressalto_extrus_o4_sides = [ressalto_extrus_o4_tool.faces().sort_by_distance(p)[0] for p in [
        (45, 0, -48.5),
        (30, -7.5, -48.5),
        (15, 0, -48.5),
        (30, 7.5, -48.5),
    ]]
    draft(ressalto_extrus_o4_sides, Plane(origin=(0, 0, -45), x_dir=(-1, 0, 0), z_dir=(0, 0, -1)), RESSALTO_EXTRUS_O4_DRAFT)


with BuildPart() as part_3:
    add(part_2.part)

    # Ressalto-extrusão4: add ressalto_extrus_o4_tool
    add(ressalto_extrus_o4_tool.part)


with BuildPart() as ressalto_extrus_o4_profile_2_tool:
    # Esboço4 → Ressalto-extrusão4 profile 2 (with draft: the straight prism first)
    with BuildSketch(Plane(origin=(0, 0, -45), x_dir=(-1, 0, 0), z_dir=(0, 0, -1))):
        with Locations((30, 0)):
            Rectangle(ESBO_O4_W, ESBO_O4_H)
    extrude(amount=RESSALTO_EXTRUS_O4_PROFILE_2_DEPTH)
    # Ressalto-extrusão4 profile 2: the draft: its side faces are tilted about the plane it starts from
    ressalto_extrus_o4_profile_2_sides = [ressalto_extrus_o4_profile_2_tool.faces().sort_by_distance(p)[0] for p in [
        (-15, 0, -48.5),
        (-30, -7.5, -48.5),
        (-45, 0, -48.5),
        (-30, 7.5, -48.5),
    ]]
    draft(ressalto_extrus_o4_profile_2_sides, Plane(origin=(0, 0, -45), x_dir=(-1, 0, 0), z_dir=(0, 0, -1)), RESSALTO_EXTRUS_O4_PROFILE_2_DRAFT)


with BuildPart() as part_4:
    add(part_3.part)

    # Ressalto-extrusão4 profile 2: add ressalto_extrus_o4_profile_2_tool
    add(ressalto_extrus_o4_profile_2_tool.part)

    # Esboço8 → Corte-extrusão1 (cut, symmetric)
    with BuildSketch(Plane(origin=(0, 0, 0), x_dir=(0, 0, -1), z_dir=(1, 0, 0))):
        Polygon((-52, 9.375644347), (-50.055570404, -8.854636007), (-52, -9.375644347), align=None)
    extrude(amount=CORTE_EXTRUS_O1_DEPTH, both=True, mode=Mode.SUBTRACT)

    # Esboço7 → Corte-extrusão2 (cut, symmetric)
    with BuildSketch(Plane(origin=(0, 0, 0), x_dir=(0, 0, -1), z_dir=(1, 0, 0))):
        Polygon((52, 9.375644347), (52, -9.375644347), (50.055570404, 8.854636007), align=None)
    extrude(amount=CORTE_EXTRUS_O2_DEPTH, both=True, mode=Mode.SUBTRACT)

    # Filete4
    # the kernel refuses this fillet: 8 mm, written as the material it takes off along each edge
    with BuildSketch(Plane(origin=(37.089156252, -8.854636007, 50.055570404), x_dir=(0, 0.2588190451025214, -0.9659258262890682), z_dir=(-1, 0, 0))) as filete4_piece_1:
        with BuildLine():
            CenterArc((9.188260198, -6.954360309), FILETE4_R, 119.623178498, 69.288708643)
            Line((1.284838224, -8.193683147), (1.126769784, -8.218469603))
            Line((1.126769784, -8.218469603), (-0.158068439, -0.024786457))
            Line((-0.158068439, -0.024786457), (0, 0.16))
            ThreePointArc((0, 0.16), (2.616955809, 0.16), (5.154824646, 0.139087206))
            Line((5.154824646, 0.139087206), (5.233911617, 0))
        make_face()
    extrude(amount=74.178312504, mode=Mode.SUBTRACT)
    with BuildSketch(Plane(origin=(-7.089156252, 8.854636007, -50.055570404), x_dir=(0, -0.25881904510252035, 0.9659258262890684), z_dir=(1, 0, 0)), Plane(origin=(-67.089156252, 8.854636007, -50.055570404), x_dir=(0, -0.2588190451025244, 0.9659258262890674), z_dir=(1, 0, 0))) as filete4_piece_2:
        with BuildLine():
            CenterArc((9.188260198, 6.954360309), FILETE4_R, 171.088112859, 69.288708643)
            Line((1.284838224, 8.193683147), (1.126769784, 8.218469603))
            Line((1.126769784, 8.218469603), (-0.158068439, 0.024786457))
            Line((-0.158068439, 0.024786457), (0, -0.16))
            ThreePointArc((0, -0.16), (2.616955809, -0.16), (5.154824646, -0.139087206))
            Line((5.154824646, -0.139087206), (5.233911617, 0))
        make_face()
    extrude(amount=74.178312504, mode=Mode.SUBTRACT)


solid = part_4.part
